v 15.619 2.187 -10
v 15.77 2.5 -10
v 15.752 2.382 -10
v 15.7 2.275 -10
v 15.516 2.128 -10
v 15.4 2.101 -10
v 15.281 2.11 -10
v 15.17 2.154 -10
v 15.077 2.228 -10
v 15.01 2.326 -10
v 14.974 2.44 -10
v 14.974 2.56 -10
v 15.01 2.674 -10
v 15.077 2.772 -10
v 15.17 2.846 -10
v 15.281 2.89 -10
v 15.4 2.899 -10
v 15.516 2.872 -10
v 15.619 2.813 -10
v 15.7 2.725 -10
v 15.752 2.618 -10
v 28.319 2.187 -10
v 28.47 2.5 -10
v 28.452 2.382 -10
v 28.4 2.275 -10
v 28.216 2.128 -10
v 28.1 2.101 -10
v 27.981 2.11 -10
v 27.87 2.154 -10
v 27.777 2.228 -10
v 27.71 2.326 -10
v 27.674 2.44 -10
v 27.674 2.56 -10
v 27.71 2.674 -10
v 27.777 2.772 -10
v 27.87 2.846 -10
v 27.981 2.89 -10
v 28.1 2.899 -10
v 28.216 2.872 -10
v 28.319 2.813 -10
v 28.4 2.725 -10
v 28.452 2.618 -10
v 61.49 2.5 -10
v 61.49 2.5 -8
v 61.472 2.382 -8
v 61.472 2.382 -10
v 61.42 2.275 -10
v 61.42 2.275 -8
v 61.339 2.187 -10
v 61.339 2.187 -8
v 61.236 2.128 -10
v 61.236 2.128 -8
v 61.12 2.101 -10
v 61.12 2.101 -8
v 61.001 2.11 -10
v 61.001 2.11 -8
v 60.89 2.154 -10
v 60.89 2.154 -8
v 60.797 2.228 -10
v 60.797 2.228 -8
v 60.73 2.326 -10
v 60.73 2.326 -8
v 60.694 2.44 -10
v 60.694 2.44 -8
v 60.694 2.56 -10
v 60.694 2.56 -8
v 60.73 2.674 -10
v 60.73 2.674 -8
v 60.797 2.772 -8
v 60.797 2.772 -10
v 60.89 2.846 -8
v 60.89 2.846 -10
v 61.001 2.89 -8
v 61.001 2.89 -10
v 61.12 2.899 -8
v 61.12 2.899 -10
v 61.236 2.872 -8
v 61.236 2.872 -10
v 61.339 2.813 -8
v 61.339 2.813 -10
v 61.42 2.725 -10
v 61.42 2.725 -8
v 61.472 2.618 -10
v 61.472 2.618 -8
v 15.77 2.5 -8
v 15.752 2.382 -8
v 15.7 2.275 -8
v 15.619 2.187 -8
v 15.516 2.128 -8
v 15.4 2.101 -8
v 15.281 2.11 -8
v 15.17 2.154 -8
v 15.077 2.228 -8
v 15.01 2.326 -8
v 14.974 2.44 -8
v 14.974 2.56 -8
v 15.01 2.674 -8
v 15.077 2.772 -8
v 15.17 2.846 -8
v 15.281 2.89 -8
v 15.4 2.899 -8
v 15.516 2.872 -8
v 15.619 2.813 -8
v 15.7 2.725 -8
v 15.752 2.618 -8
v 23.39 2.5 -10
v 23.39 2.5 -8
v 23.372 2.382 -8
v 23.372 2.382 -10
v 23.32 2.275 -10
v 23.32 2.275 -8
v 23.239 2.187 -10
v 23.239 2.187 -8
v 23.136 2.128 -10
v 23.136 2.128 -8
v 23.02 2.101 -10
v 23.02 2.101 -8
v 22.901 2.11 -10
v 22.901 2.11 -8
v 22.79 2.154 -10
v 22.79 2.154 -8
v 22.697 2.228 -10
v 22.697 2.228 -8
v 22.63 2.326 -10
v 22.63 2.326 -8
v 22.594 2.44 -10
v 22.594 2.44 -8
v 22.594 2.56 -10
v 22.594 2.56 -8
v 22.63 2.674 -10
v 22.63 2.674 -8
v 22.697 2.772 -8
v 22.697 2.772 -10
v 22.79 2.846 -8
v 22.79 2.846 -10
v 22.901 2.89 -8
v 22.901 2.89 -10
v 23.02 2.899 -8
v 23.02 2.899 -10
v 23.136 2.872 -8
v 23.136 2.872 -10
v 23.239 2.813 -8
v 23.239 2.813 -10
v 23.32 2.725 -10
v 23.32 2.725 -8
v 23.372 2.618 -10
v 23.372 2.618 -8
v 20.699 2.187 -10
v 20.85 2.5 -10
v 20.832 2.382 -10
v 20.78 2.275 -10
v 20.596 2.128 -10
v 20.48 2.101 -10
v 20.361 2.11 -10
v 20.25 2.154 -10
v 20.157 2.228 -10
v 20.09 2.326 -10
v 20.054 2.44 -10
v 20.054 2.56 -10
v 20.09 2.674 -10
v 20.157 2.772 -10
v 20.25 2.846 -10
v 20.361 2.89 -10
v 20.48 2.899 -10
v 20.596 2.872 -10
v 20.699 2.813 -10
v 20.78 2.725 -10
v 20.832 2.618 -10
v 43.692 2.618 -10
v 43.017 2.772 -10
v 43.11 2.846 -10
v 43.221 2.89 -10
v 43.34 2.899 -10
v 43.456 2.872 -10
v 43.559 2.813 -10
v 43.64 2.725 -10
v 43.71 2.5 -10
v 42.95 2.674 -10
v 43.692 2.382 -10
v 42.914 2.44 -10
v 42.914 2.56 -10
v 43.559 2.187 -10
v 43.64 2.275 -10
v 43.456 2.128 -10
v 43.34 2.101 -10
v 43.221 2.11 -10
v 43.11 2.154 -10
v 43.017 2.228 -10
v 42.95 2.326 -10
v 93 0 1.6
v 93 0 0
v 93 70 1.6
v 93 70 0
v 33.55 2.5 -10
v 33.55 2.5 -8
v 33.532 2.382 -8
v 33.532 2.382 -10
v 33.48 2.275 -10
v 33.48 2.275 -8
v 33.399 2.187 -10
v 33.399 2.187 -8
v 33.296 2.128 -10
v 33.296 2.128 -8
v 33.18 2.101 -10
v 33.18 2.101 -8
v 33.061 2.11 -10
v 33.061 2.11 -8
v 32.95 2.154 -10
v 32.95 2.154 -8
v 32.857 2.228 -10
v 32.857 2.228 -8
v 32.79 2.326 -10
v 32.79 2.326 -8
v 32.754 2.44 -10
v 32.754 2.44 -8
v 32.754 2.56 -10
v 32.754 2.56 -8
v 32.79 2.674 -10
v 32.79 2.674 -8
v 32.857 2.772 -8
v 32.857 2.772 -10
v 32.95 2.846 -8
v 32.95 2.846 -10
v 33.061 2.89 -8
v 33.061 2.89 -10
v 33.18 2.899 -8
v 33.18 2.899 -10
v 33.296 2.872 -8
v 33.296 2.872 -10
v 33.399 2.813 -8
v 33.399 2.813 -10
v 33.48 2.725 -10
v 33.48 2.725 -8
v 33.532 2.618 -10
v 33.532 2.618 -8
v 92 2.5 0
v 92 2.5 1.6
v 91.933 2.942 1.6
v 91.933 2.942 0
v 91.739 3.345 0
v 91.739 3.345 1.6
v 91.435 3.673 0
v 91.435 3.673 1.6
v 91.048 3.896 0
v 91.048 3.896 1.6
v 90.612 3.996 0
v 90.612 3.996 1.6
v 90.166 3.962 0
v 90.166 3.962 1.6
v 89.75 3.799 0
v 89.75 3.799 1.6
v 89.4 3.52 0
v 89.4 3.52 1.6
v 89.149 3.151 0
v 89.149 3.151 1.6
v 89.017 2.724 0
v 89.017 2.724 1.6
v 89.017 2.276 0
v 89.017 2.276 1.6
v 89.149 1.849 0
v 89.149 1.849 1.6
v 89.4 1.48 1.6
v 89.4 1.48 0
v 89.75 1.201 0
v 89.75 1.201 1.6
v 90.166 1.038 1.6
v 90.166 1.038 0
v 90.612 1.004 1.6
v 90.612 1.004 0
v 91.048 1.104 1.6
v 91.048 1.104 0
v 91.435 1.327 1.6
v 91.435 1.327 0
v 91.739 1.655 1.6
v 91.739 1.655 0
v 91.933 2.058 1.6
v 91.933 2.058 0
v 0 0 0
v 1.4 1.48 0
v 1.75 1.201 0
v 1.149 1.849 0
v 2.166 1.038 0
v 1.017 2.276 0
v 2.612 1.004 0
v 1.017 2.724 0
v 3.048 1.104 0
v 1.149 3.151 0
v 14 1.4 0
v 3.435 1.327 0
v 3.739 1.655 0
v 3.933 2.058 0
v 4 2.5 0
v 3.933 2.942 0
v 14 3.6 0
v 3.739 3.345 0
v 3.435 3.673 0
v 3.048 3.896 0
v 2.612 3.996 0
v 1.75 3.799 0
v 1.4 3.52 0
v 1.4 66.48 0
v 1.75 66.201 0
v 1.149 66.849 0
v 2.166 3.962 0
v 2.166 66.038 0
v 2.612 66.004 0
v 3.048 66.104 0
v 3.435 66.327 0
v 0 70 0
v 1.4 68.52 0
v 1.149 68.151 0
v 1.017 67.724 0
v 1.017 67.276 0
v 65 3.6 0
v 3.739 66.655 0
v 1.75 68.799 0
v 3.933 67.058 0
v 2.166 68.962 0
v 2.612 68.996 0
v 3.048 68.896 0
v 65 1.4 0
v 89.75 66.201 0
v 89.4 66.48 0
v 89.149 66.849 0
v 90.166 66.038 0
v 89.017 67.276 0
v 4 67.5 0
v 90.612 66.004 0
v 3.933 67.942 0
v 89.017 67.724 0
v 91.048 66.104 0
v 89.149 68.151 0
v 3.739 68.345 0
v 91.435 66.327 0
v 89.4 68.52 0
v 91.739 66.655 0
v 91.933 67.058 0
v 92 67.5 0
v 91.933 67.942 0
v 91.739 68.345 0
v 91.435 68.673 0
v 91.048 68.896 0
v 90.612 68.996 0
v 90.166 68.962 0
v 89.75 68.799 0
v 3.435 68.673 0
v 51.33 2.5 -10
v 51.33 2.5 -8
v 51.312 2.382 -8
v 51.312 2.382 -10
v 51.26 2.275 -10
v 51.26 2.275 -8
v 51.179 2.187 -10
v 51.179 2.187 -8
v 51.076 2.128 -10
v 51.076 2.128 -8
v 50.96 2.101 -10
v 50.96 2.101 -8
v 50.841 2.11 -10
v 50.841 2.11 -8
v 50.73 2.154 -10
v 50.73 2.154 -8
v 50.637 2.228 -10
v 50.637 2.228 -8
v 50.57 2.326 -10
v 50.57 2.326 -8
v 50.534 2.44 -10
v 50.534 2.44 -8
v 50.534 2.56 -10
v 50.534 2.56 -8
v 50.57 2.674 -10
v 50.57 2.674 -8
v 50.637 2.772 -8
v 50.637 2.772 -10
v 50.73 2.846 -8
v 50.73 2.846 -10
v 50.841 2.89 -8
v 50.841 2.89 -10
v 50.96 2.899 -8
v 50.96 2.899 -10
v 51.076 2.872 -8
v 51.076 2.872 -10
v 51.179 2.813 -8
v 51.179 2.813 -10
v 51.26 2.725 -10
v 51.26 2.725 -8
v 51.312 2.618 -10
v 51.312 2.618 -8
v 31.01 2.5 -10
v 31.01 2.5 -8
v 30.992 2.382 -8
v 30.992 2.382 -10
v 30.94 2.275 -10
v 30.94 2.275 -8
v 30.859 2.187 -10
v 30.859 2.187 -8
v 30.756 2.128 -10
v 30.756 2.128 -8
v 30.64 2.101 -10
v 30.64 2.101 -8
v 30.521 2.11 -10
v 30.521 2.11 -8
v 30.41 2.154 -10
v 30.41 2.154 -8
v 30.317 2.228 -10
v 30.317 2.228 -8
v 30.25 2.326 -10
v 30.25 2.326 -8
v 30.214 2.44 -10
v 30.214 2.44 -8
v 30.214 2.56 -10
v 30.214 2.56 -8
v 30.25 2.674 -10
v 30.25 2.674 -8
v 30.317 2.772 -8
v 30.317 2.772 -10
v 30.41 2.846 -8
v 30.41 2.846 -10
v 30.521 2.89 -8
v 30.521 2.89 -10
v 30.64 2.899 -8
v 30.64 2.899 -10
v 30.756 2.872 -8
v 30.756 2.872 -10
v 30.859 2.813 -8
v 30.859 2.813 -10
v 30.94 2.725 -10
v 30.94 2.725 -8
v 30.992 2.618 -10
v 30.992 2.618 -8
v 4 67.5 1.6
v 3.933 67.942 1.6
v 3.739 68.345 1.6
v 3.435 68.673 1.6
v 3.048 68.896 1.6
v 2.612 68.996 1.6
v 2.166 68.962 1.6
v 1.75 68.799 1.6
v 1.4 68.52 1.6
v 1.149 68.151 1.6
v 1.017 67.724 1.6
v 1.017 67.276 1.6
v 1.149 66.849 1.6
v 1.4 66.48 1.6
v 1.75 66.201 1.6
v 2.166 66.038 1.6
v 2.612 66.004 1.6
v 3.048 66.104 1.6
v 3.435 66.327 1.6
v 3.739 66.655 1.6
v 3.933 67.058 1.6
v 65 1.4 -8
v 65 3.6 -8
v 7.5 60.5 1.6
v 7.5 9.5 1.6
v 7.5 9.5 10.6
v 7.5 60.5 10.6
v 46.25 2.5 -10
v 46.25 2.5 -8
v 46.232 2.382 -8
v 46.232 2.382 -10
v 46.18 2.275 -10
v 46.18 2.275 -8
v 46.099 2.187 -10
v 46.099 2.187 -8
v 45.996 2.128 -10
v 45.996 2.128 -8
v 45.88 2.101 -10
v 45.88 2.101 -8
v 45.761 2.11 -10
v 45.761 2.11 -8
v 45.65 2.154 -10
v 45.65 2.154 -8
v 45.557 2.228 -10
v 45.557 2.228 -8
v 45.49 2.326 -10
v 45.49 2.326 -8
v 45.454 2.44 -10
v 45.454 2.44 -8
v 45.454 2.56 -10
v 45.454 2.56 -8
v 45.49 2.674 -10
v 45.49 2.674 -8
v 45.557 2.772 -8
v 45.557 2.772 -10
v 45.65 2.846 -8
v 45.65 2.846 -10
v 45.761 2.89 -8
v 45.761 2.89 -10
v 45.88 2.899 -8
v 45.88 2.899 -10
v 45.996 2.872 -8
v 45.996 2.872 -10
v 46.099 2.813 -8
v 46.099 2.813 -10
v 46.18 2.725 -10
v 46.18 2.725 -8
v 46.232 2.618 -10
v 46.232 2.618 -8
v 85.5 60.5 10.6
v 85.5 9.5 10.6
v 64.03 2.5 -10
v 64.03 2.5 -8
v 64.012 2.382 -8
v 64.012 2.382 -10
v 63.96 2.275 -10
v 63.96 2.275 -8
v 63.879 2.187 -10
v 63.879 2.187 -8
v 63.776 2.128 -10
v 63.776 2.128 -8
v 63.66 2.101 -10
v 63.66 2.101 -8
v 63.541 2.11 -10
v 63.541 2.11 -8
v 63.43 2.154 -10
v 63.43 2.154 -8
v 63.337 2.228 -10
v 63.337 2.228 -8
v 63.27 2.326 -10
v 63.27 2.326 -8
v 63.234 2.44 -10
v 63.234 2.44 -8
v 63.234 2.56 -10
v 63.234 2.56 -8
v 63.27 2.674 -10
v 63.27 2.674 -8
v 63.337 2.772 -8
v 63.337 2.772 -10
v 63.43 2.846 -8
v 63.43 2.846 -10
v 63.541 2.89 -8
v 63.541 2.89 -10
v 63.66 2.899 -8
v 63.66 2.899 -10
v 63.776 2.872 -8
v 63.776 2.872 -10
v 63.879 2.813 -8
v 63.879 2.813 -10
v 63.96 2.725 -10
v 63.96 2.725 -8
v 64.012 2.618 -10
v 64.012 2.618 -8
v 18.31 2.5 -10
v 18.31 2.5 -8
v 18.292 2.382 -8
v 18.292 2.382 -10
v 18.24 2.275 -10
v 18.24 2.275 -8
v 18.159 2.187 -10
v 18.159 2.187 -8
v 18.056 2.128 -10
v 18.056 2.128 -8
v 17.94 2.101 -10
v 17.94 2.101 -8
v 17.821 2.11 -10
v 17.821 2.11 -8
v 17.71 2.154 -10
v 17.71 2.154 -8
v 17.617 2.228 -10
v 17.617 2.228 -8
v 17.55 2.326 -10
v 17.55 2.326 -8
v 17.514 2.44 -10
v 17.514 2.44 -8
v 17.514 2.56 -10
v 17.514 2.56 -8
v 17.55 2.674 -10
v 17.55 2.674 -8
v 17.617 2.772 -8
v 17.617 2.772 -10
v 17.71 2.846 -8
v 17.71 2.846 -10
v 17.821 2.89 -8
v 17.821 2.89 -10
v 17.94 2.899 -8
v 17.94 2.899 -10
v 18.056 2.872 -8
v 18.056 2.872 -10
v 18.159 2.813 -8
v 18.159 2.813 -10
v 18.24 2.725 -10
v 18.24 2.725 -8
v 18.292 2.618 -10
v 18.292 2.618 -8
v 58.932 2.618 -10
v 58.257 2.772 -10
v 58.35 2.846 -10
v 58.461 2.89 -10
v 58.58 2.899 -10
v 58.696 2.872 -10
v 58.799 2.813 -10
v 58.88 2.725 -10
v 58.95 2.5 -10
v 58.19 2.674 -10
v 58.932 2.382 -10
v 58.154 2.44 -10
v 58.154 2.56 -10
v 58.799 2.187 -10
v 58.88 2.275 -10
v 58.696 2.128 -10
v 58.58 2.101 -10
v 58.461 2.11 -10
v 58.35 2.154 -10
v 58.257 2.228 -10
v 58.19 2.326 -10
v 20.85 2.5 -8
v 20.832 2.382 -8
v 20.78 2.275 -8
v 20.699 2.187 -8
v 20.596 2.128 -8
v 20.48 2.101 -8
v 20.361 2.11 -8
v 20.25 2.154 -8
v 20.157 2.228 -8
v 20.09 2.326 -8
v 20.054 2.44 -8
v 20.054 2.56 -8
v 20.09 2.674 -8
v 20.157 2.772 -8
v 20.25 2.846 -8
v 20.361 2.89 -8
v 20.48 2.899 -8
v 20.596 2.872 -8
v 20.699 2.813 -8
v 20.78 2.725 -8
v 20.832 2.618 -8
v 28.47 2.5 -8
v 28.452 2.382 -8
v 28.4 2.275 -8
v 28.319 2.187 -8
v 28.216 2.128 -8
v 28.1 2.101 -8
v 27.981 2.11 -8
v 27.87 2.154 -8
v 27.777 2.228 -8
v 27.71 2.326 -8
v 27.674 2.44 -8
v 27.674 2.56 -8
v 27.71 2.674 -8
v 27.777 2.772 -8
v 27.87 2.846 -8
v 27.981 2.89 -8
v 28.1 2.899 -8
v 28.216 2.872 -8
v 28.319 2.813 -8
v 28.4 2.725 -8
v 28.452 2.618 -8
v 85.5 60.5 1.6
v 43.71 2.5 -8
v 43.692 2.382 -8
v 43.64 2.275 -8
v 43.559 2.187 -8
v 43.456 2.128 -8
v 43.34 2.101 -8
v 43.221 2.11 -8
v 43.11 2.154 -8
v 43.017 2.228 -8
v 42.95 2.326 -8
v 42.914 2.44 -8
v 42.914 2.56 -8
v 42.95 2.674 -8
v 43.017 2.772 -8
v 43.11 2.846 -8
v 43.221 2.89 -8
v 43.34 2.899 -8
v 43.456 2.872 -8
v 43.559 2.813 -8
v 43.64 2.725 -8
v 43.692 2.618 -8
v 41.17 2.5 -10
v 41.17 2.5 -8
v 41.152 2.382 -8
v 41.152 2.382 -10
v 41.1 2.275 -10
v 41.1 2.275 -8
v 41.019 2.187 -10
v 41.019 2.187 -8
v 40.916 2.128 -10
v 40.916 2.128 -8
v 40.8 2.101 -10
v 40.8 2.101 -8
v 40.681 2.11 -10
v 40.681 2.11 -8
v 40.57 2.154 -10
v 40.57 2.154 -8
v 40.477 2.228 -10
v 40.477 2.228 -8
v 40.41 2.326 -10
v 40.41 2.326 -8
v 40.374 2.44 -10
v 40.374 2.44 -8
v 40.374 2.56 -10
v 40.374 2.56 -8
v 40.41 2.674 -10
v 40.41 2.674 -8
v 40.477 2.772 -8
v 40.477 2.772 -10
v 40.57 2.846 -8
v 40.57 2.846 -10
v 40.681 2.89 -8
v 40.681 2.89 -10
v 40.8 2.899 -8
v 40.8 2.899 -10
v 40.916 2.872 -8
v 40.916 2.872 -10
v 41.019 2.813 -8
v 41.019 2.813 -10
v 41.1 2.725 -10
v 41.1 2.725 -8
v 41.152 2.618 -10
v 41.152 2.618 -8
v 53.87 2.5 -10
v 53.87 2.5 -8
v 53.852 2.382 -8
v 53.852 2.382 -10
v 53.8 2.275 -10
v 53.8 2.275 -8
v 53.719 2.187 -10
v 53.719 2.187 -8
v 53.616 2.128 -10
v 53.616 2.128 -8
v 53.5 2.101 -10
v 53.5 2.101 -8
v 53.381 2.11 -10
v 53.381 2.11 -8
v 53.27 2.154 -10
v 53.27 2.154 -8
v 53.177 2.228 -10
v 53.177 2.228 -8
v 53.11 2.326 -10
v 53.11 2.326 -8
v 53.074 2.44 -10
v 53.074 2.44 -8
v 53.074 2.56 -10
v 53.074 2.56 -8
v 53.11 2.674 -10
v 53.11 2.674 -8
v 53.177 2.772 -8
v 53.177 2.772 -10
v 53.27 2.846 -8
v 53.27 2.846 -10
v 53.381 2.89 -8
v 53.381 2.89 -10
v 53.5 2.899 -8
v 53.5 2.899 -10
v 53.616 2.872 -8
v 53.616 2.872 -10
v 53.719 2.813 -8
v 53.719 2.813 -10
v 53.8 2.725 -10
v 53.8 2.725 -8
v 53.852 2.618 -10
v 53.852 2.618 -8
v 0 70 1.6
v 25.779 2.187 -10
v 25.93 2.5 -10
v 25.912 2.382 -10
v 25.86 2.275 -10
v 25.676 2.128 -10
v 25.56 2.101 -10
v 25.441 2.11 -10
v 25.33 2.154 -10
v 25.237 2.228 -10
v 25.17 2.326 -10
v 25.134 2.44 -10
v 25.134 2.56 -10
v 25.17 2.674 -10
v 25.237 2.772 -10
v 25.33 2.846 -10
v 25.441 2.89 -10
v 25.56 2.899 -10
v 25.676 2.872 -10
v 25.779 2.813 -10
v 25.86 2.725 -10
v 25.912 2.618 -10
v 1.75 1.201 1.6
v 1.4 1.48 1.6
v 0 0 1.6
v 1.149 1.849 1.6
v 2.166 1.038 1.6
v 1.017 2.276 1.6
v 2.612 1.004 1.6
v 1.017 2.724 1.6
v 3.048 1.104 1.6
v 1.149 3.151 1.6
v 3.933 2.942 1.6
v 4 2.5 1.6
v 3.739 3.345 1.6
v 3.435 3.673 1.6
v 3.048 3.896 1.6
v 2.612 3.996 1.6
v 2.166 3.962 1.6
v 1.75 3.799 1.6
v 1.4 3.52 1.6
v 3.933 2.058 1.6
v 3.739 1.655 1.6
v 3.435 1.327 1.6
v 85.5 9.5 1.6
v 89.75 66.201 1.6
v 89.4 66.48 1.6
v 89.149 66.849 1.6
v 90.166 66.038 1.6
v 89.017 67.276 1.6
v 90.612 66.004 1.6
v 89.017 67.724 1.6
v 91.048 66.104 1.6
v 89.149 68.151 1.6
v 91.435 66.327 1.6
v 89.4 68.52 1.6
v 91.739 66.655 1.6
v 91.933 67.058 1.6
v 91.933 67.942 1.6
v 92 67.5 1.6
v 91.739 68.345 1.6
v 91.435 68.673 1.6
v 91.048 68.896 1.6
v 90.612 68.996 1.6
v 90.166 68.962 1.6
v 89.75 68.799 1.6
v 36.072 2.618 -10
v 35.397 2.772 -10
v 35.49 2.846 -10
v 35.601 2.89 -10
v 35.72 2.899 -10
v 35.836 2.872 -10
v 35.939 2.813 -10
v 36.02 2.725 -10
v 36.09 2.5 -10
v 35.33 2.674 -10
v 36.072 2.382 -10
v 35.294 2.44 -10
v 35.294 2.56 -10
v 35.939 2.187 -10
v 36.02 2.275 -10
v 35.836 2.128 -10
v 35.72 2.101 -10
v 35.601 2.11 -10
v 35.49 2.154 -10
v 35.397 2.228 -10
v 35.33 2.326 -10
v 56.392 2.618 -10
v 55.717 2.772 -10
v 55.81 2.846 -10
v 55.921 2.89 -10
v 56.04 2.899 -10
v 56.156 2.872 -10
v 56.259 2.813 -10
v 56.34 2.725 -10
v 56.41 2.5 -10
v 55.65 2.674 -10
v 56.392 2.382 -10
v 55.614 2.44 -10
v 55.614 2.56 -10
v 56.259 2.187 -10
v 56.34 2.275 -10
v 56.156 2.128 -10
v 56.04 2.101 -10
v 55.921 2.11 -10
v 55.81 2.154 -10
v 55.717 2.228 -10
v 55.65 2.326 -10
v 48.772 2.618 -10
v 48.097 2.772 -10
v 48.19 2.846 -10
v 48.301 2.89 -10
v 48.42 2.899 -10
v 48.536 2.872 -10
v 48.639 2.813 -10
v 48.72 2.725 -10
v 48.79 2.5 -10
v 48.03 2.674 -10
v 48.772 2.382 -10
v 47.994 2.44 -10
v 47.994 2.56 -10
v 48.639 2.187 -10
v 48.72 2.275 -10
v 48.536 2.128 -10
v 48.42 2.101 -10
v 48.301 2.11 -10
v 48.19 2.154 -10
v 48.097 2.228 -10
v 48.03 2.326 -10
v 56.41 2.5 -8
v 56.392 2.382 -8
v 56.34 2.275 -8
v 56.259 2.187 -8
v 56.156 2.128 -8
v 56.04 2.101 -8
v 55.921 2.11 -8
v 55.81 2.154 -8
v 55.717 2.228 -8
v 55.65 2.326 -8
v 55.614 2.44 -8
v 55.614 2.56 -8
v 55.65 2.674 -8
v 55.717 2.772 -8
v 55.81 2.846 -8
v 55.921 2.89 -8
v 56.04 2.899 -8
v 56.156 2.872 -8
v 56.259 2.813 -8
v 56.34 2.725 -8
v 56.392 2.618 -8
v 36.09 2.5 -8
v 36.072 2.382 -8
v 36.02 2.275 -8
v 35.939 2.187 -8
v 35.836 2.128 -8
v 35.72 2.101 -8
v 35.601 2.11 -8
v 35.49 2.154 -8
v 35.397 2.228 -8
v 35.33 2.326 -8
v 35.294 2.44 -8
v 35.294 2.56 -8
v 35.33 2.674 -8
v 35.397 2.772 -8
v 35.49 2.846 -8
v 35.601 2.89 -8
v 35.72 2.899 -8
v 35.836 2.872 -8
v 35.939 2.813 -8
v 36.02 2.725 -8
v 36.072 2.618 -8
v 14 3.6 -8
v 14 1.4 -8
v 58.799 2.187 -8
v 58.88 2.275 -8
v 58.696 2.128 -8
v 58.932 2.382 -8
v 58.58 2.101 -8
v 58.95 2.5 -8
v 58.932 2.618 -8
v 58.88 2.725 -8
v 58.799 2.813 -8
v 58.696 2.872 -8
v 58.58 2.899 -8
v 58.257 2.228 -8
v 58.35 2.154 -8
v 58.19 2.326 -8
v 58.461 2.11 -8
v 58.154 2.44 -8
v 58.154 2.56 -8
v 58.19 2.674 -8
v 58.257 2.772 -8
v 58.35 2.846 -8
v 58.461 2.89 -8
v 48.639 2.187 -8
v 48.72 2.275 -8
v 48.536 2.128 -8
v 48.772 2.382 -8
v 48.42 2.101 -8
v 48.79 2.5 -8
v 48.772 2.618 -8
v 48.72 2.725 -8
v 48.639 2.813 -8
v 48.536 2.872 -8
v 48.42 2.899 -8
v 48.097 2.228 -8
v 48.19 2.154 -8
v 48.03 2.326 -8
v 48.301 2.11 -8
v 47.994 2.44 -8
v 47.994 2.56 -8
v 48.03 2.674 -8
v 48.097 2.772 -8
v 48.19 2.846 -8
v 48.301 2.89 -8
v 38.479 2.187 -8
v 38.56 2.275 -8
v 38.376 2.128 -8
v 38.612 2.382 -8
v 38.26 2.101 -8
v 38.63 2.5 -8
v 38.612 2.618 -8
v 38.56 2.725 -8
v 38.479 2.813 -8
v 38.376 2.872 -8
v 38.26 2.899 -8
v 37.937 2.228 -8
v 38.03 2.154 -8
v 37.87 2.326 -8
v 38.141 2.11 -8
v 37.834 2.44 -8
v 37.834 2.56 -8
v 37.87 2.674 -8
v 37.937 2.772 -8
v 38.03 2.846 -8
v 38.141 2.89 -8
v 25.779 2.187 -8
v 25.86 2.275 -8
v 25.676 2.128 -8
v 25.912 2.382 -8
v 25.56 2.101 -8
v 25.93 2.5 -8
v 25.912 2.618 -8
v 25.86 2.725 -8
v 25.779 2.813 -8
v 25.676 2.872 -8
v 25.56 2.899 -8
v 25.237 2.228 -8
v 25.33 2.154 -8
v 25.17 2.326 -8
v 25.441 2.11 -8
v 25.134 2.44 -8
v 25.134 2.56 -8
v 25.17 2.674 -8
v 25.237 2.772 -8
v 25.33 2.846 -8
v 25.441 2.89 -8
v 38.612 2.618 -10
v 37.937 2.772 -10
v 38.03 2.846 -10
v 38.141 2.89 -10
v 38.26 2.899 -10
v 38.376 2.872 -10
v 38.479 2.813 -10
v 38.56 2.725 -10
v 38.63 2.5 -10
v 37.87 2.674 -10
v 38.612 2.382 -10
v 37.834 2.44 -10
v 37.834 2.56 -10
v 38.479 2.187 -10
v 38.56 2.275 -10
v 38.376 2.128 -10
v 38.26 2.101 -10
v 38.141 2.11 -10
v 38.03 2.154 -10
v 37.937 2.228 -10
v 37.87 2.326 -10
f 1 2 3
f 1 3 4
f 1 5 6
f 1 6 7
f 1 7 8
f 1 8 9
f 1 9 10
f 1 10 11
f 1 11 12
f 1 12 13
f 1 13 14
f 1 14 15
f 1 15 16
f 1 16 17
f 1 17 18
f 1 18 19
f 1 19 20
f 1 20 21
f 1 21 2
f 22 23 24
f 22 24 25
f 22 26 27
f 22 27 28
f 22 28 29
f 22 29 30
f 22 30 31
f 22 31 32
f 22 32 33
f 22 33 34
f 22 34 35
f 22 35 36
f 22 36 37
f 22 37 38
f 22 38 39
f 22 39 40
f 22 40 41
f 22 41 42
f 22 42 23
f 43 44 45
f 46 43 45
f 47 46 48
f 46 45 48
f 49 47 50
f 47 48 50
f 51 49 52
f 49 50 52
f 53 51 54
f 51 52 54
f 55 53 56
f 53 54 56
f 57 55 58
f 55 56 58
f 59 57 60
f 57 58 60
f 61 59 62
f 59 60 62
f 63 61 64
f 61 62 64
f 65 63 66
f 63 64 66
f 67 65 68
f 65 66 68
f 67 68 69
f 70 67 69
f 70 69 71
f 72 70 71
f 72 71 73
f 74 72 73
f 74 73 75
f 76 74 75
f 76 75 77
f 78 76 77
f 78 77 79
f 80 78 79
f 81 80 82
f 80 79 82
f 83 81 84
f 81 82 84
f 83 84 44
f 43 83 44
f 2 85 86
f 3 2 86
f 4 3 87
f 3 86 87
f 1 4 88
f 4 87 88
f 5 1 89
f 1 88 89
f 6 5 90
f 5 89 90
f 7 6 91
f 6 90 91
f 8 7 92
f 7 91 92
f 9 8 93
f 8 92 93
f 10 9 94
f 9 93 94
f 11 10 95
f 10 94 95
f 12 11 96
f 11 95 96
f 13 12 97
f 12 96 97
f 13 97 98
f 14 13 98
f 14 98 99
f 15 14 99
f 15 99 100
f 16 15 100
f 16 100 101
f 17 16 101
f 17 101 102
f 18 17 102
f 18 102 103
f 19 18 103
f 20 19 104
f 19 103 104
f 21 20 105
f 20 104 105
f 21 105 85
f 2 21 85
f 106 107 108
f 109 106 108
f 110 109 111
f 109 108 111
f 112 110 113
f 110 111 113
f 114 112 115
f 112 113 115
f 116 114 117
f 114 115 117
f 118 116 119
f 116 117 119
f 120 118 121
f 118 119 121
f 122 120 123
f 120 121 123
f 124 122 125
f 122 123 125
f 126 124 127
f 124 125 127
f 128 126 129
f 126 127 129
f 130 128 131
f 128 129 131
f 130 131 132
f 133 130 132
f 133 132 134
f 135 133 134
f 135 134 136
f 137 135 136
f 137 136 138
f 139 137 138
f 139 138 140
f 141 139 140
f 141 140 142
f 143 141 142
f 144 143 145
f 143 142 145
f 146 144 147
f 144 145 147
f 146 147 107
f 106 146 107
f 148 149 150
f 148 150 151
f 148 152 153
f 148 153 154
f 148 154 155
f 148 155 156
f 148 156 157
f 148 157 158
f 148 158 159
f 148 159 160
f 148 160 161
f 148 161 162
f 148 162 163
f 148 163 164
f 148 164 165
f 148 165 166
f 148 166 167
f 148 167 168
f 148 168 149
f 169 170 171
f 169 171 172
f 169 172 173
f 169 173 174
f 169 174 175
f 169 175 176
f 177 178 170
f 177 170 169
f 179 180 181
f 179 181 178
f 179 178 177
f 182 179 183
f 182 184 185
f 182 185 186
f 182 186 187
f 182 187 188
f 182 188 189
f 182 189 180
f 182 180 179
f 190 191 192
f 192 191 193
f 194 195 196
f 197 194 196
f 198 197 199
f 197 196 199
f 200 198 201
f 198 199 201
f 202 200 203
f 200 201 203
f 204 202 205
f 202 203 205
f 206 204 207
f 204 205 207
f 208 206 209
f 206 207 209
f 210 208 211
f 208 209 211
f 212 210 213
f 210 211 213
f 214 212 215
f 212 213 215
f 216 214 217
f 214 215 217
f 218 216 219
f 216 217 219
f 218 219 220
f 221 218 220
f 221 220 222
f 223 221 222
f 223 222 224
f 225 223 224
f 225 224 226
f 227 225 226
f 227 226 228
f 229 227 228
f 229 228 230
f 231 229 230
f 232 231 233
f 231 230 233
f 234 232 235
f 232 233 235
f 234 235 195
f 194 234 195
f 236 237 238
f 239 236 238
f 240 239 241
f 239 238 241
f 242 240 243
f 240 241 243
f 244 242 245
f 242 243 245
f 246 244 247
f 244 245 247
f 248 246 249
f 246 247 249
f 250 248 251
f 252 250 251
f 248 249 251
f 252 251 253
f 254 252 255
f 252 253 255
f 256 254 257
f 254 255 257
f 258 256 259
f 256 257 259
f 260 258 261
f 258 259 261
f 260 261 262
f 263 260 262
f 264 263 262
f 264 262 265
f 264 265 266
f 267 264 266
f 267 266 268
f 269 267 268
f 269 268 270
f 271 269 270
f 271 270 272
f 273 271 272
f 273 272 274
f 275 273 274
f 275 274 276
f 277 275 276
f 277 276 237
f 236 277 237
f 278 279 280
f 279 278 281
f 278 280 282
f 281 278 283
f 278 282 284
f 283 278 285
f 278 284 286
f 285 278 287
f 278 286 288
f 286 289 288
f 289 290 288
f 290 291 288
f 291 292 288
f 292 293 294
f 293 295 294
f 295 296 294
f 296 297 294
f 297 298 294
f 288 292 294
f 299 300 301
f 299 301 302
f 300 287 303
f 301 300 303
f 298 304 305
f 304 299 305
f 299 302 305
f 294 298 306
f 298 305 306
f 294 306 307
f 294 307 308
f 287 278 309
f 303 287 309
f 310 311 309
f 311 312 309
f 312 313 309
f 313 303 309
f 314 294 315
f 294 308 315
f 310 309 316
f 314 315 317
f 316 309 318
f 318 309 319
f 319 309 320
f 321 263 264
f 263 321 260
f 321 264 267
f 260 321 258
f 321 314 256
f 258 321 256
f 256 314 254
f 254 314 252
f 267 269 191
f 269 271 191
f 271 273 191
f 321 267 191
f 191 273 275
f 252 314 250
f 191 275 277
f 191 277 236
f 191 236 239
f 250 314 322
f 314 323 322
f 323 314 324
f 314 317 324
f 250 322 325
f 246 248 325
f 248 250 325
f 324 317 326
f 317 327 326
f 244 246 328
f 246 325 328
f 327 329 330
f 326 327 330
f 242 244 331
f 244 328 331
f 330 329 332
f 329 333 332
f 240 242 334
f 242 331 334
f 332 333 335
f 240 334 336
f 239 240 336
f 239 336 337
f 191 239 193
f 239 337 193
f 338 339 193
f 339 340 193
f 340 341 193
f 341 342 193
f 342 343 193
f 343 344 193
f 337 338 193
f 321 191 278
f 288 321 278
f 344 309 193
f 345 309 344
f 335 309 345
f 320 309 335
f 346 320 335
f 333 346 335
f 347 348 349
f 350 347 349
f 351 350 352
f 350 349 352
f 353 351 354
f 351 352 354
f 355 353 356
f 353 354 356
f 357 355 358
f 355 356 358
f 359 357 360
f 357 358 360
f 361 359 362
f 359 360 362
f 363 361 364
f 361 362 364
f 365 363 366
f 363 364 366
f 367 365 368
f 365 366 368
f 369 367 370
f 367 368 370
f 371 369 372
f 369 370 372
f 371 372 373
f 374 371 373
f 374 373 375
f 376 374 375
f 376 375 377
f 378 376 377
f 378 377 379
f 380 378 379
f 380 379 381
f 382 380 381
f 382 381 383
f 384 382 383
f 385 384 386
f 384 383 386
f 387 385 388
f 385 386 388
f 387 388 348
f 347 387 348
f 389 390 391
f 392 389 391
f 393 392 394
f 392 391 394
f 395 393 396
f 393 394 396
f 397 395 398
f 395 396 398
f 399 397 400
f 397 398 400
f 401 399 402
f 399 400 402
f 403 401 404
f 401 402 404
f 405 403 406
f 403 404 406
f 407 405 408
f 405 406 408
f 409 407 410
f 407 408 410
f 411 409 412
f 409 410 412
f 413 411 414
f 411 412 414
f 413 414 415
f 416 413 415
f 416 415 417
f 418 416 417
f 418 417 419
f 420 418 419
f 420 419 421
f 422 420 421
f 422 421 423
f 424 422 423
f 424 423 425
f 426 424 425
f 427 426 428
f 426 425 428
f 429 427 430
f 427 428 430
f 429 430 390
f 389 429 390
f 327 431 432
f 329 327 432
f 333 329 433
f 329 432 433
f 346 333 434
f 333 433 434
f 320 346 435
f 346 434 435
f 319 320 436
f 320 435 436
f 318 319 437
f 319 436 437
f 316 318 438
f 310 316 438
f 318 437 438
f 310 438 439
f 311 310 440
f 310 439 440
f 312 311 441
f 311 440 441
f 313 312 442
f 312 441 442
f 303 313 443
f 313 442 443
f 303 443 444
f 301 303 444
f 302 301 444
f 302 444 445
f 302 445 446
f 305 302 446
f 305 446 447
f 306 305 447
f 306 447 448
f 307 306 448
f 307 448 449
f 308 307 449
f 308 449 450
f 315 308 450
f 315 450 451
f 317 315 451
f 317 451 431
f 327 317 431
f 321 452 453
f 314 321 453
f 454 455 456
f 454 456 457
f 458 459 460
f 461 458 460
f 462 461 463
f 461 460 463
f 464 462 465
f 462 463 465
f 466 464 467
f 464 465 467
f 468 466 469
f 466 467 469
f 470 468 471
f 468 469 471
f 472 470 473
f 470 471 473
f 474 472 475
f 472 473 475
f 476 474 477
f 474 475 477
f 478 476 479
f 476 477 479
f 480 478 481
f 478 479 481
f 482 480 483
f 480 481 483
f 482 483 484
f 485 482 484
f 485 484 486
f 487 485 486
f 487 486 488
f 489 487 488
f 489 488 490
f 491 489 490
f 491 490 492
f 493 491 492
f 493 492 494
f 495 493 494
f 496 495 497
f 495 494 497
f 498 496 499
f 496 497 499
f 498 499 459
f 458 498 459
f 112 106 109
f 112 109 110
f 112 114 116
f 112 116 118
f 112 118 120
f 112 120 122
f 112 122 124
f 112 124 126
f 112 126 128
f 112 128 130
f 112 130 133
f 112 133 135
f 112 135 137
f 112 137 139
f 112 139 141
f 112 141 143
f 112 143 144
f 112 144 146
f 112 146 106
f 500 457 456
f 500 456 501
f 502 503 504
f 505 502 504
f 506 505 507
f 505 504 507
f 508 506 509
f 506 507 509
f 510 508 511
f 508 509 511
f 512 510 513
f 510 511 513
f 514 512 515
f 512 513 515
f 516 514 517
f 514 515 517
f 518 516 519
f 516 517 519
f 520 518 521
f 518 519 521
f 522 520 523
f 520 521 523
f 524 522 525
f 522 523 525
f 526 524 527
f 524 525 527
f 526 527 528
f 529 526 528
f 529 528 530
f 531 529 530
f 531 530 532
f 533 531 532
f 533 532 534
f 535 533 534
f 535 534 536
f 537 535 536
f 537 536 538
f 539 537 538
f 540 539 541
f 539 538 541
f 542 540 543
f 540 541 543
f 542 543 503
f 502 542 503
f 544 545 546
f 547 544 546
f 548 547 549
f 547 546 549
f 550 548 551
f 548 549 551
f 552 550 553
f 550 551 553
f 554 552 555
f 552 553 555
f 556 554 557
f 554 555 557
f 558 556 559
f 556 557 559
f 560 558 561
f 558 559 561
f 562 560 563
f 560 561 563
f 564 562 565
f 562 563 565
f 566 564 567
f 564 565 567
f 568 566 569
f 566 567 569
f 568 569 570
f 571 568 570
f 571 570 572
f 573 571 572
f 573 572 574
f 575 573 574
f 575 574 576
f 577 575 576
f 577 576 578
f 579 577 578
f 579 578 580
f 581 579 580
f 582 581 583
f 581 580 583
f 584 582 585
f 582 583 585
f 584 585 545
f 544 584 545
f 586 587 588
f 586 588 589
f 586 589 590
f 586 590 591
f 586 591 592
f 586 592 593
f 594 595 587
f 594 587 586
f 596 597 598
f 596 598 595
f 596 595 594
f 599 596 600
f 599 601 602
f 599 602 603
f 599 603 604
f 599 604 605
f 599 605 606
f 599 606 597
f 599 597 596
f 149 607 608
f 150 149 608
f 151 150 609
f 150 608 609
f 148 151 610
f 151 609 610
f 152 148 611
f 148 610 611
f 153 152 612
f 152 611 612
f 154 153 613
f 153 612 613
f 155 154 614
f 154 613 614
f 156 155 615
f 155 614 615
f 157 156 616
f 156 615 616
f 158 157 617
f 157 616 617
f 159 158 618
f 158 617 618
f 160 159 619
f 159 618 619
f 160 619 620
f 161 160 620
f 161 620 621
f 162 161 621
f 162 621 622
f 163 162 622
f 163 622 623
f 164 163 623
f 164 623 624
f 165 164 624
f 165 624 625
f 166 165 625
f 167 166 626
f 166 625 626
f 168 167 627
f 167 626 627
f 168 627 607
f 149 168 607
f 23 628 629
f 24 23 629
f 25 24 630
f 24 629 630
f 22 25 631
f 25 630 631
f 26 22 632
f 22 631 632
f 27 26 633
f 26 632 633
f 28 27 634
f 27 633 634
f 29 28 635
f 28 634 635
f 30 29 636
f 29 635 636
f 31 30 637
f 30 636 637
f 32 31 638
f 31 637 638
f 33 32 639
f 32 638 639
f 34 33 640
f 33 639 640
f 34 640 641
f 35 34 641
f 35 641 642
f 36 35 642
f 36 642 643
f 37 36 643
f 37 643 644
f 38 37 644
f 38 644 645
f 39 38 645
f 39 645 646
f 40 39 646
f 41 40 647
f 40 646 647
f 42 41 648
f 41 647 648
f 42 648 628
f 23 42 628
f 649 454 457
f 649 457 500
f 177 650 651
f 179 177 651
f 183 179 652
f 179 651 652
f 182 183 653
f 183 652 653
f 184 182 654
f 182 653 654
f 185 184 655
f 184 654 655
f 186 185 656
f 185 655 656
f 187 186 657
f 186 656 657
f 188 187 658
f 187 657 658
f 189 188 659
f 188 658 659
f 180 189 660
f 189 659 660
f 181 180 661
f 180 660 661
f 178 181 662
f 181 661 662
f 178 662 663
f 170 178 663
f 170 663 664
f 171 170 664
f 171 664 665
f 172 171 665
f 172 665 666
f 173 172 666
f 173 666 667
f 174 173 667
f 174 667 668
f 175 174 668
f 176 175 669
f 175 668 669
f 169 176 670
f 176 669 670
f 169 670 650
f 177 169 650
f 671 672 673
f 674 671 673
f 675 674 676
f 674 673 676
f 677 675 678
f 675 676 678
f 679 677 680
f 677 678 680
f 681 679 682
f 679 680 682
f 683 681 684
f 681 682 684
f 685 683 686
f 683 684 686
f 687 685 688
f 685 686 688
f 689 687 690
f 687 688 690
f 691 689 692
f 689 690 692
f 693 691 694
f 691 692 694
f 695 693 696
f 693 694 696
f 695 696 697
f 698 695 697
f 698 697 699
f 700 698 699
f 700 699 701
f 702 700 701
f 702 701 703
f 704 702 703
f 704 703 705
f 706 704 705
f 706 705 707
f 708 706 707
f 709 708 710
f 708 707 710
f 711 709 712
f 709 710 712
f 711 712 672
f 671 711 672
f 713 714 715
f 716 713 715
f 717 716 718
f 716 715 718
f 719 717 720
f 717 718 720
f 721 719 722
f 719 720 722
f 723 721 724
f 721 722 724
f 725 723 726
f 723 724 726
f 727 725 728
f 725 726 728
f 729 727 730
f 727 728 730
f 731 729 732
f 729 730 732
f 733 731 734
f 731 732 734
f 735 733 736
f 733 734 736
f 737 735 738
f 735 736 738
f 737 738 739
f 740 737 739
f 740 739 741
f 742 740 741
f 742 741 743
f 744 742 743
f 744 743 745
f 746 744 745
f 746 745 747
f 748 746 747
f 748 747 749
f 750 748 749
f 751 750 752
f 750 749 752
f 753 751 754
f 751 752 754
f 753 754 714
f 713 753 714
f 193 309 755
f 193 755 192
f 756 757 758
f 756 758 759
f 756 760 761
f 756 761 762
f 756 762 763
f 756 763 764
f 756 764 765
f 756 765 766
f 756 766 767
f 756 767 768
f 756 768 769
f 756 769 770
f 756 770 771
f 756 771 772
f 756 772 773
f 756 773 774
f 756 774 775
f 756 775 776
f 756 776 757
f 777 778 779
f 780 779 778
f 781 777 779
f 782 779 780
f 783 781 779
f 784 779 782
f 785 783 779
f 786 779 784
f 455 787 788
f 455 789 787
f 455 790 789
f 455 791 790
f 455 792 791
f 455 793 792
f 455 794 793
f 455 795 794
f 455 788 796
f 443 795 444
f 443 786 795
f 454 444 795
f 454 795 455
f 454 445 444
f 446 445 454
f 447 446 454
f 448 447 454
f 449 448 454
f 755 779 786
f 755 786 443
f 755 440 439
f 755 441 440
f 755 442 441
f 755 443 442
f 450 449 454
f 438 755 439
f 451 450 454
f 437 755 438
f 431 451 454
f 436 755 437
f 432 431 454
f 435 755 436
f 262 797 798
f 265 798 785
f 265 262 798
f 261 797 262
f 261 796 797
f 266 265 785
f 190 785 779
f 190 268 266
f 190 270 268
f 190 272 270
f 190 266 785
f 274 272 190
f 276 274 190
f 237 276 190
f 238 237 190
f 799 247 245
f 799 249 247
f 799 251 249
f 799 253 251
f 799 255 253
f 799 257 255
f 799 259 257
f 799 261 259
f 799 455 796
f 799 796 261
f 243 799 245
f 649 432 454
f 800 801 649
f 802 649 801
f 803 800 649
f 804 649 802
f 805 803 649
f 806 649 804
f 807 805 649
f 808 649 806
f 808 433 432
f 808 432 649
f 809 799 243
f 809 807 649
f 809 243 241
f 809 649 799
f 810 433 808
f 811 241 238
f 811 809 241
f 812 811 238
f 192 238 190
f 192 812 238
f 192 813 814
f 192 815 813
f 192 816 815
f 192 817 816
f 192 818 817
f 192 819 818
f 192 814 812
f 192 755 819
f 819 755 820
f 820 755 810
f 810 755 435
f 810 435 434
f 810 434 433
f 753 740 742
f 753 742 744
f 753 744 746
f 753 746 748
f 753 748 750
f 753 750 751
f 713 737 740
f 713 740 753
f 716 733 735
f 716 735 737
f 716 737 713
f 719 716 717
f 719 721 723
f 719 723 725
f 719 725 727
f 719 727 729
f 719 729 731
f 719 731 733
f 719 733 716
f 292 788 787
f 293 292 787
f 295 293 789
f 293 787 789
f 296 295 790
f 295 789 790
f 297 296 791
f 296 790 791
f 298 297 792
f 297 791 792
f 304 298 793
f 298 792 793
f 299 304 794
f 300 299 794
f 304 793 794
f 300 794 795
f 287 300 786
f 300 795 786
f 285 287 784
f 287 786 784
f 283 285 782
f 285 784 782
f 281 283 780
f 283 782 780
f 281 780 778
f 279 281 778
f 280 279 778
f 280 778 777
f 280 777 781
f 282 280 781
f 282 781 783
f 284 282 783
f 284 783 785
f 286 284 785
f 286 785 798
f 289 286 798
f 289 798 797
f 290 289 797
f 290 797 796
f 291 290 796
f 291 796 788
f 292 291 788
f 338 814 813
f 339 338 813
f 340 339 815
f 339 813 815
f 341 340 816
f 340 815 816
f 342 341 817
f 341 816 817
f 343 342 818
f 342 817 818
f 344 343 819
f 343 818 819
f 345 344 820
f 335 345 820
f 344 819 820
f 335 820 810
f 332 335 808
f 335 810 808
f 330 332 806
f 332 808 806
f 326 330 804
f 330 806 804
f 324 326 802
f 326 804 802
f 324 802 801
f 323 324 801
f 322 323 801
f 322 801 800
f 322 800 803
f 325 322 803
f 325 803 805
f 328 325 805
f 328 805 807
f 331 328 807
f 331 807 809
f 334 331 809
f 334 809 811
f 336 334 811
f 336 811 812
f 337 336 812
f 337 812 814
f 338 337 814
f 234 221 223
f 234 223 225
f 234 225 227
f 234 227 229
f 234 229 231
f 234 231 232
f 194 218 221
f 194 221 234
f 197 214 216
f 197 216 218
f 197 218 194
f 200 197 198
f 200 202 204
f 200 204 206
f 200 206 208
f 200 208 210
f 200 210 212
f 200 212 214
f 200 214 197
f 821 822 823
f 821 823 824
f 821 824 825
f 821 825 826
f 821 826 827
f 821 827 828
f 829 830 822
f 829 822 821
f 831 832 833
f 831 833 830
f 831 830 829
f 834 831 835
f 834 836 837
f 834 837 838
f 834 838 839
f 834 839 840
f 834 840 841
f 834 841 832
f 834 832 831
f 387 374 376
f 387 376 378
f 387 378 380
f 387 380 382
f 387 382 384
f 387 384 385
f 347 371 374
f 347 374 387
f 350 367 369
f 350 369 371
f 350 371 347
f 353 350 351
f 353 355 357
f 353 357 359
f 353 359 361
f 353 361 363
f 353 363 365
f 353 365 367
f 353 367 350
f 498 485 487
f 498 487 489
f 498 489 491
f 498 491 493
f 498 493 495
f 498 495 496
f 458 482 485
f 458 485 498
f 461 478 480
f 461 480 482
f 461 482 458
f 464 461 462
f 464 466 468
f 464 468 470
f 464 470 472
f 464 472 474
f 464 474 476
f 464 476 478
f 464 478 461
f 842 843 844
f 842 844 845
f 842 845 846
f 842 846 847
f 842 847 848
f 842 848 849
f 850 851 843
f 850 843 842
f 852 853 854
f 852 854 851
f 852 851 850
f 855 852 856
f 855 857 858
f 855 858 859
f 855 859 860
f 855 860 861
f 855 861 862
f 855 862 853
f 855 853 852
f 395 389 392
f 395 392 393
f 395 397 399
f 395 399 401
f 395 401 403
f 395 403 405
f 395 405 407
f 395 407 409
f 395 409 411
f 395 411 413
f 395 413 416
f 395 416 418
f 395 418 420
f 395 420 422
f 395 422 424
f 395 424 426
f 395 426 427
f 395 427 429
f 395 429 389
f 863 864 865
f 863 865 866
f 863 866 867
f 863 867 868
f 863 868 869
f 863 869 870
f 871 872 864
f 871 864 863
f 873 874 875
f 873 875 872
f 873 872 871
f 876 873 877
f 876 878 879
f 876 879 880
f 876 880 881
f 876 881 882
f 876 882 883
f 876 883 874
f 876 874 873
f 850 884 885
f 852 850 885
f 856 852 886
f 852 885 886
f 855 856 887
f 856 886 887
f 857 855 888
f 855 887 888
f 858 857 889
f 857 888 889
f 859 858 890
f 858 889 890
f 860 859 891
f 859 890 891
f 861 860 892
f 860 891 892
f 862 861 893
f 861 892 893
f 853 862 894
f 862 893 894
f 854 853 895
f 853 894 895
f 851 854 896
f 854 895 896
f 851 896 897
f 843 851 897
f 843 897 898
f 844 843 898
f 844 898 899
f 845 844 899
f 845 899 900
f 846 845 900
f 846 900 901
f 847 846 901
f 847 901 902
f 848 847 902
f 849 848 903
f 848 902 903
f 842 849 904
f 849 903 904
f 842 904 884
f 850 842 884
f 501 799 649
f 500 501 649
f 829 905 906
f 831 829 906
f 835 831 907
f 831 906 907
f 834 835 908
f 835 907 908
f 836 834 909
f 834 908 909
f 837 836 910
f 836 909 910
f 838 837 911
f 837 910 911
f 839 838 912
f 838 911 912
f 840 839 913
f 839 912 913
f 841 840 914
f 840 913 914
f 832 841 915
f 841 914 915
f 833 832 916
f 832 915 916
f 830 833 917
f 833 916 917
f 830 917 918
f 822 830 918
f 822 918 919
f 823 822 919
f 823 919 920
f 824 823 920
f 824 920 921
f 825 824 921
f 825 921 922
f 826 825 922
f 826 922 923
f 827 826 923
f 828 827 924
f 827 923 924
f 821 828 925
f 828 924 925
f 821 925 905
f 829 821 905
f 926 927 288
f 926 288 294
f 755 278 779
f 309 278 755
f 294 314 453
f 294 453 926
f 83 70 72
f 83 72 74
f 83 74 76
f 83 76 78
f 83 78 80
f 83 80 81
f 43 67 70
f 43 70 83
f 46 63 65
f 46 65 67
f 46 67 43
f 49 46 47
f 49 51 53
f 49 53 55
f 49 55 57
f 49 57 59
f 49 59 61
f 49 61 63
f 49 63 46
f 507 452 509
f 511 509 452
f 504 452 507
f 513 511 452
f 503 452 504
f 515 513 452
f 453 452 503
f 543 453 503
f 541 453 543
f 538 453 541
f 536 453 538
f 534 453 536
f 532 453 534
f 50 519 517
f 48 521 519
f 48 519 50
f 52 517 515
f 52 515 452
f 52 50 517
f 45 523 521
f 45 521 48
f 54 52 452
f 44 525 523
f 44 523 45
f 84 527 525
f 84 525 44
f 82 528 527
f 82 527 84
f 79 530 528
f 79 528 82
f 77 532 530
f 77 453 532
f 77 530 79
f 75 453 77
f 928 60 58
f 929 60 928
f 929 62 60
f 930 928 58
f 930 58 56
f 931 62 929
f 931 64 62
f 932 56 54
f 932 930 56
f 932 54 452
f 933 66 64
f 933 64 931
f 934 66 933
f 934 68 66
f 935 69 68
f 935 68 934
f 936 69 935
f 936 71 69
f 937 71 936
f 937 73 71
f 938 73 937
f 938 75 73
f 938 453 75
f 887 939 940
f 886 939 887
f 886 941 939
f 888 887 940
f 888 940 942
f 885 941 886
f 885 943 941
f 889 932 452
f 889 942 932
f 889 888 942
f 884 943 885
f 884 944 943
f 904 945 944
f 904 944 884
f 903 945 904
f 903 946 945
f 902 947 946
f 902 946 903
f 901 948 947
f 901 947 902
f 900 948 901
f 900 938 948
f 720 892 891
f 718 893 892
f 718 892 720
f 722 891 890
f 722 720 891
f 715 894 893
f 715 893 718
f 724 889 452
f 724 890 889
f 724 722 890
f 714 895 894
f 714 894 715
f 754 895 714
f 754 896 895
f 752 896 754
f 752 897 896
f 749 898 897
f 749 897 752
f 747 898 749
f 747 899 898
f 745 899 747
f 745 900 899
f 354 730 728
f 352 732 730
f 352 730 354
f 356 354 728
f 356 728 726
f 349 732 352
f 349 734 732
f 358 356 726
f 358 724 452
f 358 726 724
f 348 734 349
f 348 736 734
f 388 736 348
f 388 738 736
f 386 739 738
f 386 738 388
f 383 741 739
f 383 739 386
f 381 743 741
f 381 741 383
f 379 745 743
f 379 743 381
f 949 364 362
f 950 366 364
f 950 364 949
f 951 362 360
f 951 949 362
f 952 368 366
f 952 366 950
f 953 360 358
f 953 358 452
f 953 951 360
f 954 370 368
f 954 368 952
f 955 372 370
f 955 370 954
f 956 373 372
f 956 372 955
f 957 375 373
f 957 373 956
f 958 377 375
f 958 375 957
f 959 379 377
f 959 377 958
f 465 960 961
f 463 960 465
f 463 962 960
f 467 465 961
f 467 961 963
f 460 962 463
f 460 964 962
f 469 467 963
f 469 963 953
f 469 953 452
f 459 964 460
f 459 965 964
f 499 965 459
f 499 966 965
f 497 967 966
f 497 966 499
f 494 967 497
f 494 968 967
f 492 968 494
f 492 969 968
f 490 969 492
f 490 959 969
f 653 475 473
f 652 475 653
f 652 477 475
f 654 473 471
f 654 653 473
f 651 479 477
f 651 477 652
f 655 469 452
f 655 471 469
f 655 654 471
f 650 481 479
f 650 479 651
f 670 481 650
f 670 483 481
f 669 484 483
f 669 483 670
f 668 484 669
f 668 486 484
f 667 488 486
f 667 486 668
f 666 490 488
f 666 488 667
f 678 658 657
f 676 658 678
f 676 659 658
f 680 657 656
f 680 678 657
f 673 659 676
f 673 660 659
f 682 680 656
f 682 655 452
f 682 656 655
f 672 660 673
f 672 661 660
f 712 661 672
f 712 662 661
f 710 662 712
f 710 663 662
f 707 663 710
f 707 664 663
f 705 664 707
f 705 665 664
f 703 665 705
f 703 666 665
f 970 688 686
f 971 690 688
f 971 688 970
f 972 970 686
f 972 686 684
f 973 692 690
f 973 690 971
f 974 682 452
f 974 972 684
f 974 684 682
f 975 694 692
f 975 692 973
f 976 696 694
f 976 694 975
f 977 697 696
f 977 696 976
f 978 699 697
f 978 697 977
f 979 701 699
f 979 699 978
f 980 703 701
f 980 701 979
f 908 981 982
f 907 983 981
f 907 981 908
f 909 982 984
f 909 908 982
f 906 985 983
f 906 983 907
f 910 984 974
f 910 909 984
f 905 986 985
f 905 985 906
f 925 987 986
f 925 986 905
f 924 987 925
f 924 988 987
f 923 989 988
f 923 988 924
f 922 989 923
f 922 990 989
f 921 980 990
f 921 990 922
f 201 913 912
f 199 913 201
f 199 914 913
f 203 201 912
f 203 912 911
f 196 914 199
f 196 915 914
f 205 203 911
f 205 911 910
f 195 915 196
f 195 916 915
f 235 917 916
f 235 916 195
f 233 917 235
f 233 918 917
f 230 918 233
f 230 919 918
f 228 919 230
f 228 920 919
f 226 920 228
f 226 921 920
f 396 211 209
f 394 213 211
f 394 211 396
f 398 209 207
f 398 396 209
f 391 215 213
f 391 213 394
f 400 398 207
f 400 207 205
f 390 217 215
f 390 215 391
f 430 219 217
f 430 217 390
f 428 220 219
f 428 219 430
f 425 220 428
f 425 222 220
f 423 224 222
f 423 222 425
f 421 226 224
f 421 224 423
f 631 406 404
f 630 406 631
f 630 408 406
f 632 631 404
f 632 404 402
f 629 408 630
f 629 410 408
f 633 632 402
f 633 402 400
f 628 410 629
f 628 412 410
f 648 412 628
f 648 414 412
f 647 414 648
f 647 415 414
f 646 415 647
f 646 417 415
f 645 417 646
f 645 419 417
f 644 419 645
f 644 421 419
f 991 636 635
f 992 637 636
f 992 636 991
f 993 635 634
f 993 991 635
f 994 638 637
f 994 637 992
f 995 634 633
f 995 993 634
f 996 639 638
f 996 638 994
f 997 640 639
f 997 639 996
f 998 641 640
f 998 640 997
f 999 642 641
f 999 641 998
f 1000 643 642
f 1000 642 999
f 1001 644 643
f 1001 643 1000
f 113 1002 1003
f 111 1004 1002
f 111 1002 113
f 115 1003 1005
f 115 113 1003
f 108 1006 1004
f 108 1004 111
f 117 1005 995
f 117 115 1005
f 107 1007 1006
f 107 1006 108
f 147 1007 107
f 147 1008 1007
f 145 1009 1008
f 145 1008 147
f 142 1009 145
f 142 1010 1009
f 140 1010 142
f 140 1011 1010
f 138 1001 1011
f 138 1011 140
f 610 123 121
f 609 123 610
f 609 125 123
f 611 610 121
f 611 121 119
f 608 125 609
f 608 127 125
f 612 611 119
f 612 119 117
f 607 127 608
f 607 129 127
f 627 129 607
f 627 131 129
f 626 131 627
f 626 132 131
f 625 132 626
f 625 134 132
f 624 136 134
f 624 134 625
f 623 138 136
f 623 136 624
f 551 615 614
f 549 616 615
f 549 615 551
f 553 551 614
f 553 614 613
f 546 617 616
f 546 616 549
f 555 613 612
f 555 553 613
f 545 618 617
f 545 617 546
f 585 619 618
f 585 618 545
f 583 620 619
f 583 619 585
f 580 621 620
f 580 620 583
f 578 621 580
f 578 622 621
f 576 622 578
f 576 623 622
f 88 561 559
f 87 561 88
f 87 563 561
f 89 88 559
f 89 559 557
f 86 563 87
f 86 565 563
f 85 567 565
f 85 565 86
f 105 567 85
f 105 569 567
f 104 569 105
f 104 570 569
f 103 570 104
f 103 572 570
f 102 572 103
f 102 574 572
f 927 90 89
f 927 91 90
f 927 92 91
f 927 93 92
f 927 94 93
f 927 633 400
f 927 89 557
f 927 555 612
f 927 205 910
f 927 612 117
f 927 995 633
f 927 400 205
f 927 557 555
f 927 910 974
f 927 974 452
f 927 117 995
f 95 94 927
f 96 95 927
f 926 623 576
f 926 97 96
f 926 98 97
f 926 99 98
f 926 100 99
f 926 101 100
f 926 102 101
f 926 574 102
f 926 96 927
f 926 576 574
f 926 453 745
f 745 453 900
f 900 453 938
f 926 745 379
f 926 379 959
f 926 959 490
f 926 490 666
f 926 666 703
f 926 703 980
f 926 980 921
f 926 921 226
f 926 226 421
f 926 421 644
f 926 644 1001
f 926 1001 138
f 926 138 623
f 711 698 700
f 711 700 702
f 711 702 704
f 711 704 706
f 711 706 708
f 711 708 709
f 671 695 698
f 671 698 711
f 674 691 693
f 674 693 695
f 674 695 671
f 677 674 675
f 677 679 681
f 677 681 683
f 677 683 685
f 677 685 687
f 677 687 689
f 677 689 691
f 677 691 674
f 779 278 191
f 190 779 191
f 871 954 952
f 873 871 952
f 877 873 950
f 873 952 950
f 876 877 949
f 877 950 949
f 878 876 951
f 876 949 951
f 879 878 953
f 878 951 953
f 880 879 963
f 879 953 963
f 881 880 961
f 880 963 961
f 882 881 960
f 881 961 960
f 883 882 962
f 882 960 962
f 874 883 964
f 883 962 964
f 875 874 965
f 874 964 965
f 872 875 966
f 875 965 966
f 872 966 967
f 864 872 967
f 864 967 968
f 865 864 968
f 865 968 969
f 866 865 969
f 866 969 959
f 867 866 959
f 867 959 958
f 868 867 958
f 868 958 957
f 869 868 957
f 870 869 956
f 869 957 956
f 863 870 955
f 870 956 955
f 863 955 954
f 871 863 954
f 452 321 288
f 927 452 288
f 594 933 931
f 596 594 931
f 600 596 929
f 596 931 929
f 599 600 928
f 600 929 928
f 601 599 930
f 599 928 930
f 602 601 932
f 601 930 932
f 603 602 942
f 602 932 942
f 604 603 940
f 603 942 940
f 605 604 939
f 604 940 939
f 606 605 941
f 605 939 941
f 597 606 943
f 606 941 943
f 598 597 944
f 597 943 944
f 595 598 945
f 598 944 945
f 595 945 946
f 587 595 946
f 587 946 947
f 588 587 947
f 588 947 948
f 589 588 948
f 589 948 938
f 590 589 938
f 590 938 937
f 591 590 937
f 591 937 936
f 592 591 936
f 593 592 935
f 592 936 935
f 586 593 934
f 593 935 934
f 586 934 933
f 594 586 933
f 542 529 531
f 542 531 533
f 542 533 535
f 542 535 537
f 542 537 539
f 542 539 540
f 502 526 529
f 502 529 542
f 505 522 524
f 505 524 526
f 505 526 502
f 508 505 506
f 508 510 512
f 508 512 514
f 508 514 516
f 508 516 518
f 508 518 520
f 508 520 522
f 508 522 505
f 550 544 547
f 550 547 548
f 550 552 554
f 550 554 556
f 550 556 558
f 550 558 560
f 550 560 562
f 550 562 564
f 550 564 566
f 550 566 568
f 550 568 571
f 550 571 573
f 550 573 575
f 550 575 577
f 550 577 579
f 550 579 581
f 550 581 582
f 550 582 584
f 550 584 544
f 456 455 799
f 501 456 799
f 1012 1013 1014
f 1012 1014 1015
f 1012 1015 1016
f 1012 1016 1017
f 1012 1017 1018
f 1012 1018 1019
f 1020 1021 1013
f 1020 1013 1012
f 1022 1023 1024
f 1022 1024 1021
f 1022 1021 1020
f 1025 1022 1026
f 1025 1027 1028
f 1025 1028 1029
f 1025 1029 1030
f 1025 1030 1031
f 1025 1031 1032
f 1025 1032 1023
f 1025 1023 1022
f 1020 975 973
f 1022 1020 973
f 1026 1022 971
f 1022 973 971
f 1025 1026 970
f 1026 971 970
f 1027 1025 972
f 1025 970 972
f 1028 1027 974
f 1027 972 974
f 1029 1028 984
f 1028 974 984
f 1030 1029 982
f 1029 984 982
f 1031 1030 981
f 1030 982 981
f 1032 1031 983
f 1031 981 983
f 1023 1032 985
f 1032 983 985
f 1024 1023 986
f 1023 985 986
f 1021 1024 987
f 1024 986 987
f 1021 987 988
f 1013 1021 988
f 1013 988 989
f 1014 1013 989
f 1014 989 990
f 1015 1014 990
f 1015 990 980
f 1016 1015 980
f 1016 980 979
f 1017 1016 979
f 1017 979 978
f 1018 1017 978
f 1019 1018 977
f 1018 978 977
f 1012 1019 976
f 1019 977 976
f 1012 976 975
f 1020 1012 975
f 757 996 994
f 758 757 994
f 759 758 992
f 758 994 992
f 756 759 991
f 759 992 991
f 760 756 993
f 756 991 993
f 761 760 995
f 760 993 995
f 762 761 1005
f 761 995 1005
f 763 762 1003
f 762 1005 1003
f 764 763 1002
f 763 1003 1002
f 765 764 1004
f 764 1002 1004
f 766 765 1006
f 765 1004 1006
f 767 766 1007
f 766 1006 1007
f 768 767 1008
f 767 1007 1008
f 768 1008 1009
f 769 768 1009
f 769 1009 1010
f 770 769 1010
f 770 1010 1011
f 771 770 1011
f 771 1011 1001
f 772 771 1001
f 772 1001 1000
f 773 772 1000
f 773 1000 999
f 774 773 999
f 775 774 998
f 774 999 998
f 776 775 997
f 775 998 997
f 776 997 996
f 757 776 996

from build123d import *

# Parameters (mm, degrees)
SKETCH_1_W          = 93
SKETCH_1_H          = 70
EXTRUDE_1_DEPTH     = 1.6
SKETCH_2_R          = 1.5
CUT_EXTRUDE_1_DEPTH = 117.411167849
SKETCH_3_W          = 78
SKETCH_3_H          = 51
EXTRUDE_2_DEPTH     = 9
SKETCH_4_W          = 51
SKETCH_4_H          = 2.2
EXTRUDE_3_DEPTH     = 8
SKETCH_5_R          = 0.4
EXTRUDE_4_DEPTH     = 2


with BuildPart() as part:
    # 草图1 → 凸台-拉伸1 (new body)
    with BuildSketch(Plane.XY):
        with Locations((46.5, 35)):
            Rectangle(SKETCH_1_W, SKETCH_1_H)
    extrude(amount=EXTRUDE_1_DEPTH)

    # 草图2 → 切除-拉伸1 (cut, through all)
    with BuildSketch(Plane.XY.offset(1.6)):
        with Locations((2.5, 2.5)):
            Circle(SKETCH_2_R)
        with Locations((90.5, 2.5)):
            Circle(SKETCH_2_R)
        with Locations((90.5, 67.5)):
            Circle(SKETCH_2_R)
        with Locations((2.5, 67.5)):
            Circle(SKETCH_2_R)
    extrude(amount=-CUT_EXTRUDE_1_DEPTH, mode=Mode.SUBTRACT)

    # 草图3 → 凸台-拉伸2 (add)
    with BuildSketch(Plane.XY.offset(1.6)):
        with Locations((46.5, 35)):
            Rectangle(SKETCH_3_W, SKETCH_3_H)
    extrude(amount=EXTRUDE_2_DEPTH)

    # 草图4 → 凸台-拉伸3 (add)
    with BuildSketch(Plane(origin=(0, 0, 0), x_dir=(-1, 0, 0), z_dir=(0, 0, -1))):
        with Locations((-39.5, 2.5)):
            Rectangle(SKETCH_4_W, SKETCH_4_H)
    extrude(amount=EXTRUDE_3_DEPTH)

    # 草图5 → 凸台-拉伸4 (add)
    with BuildSketch(Plane(origin=(0, 0, -8), x_dir=(-1, 0, 0), z_dir=(0, 0, -1))):
        with Locations(Location((-38.23, 2.5, 0), (0, 0, 180))):
            Circle(SKETCH_5_R)
        with Locations(Location((-40.77, 2.5, 0), (0, 0, 180))):
            Circle(SKETCH_5_R)
        with Locations(Location((-43.31, 2.5, 0), (0, 0, 180))):
            Circle(SKETCH_5_R)
        with Locations(Location((-45.85, 2.5, 0), (0, 0, 180))):
            Circle(SKETCH_5_R)
        with Locations(Location((-48.39, 2.5, 0), (0, 0, 180))):
            Circle(SKETCH_5_R)
        with Locations(Location((-50.93, 2.5, 0), (0, 0, 180))):
            Circle(SKETCH_5_R)
        with Locations(Location((-53.47, 2.5, 0), (0, 0, 180))):
            Circle(SKETCH_5_R)
        with Locations(Location((-56.01, 2.5, 0), (0, 0, 180))):
            Circle(SKETCH_5_R)
        with Locations(Location((-58.55, 2.5, 0), (0, 0, 180))):
            Circle(SKETCH_5_R)
        with Locations(Location((-61.09, 2.5, 0), (0, 0, 180))):
            Circle(SKETCH_5_R)
        with Locations(Location((-63.63, 2.5, 0), (0, 0, 180))):
            Circle(SKETCH_5_R)
        with Locations(Location((-35.69, 2.5, 0), (0, 0, 180))):
            Circle(SKETCH_5_R)
        with Locations(Location((-33.15, 2.5, 0), (0, 0, 180))):
            Circle(SKETCH_5_R)
        with Locations(Location((-30.61, 2.5, 0), (0, 0, 180))):
            Circle(SKETCH_5_R)
        with Locations(Location((-28.07, 2.5, 0), (0, 0, 180))):
            Circle(SKETCH_5_R)
        with Locations(Location((-25.53, 2.5, 0), (0, 0, 180))):
            Circle(SKETCH_5_R)
        with Locations(Location((-22.99, 2.5, 0), (0, 0, 180))):
            Circle(SKETCH_5_R)
        with Locations(Location((-20.45, 2.5, 0), (0, 0, 180))):
            Circle(SKETCH_5_R)
        with Locations(Location((-17.91, 2.5, 0), (0, 0, 180))):
            Circle(SKETCH_5_R)
        with Locations(Location((-15.37, 2.5, 0), (0, 0, 180))):
            Circle(SKETCH_5_R)
    extrude(amount=EXTRUDE_4_DEPTH)


solid = part.part
